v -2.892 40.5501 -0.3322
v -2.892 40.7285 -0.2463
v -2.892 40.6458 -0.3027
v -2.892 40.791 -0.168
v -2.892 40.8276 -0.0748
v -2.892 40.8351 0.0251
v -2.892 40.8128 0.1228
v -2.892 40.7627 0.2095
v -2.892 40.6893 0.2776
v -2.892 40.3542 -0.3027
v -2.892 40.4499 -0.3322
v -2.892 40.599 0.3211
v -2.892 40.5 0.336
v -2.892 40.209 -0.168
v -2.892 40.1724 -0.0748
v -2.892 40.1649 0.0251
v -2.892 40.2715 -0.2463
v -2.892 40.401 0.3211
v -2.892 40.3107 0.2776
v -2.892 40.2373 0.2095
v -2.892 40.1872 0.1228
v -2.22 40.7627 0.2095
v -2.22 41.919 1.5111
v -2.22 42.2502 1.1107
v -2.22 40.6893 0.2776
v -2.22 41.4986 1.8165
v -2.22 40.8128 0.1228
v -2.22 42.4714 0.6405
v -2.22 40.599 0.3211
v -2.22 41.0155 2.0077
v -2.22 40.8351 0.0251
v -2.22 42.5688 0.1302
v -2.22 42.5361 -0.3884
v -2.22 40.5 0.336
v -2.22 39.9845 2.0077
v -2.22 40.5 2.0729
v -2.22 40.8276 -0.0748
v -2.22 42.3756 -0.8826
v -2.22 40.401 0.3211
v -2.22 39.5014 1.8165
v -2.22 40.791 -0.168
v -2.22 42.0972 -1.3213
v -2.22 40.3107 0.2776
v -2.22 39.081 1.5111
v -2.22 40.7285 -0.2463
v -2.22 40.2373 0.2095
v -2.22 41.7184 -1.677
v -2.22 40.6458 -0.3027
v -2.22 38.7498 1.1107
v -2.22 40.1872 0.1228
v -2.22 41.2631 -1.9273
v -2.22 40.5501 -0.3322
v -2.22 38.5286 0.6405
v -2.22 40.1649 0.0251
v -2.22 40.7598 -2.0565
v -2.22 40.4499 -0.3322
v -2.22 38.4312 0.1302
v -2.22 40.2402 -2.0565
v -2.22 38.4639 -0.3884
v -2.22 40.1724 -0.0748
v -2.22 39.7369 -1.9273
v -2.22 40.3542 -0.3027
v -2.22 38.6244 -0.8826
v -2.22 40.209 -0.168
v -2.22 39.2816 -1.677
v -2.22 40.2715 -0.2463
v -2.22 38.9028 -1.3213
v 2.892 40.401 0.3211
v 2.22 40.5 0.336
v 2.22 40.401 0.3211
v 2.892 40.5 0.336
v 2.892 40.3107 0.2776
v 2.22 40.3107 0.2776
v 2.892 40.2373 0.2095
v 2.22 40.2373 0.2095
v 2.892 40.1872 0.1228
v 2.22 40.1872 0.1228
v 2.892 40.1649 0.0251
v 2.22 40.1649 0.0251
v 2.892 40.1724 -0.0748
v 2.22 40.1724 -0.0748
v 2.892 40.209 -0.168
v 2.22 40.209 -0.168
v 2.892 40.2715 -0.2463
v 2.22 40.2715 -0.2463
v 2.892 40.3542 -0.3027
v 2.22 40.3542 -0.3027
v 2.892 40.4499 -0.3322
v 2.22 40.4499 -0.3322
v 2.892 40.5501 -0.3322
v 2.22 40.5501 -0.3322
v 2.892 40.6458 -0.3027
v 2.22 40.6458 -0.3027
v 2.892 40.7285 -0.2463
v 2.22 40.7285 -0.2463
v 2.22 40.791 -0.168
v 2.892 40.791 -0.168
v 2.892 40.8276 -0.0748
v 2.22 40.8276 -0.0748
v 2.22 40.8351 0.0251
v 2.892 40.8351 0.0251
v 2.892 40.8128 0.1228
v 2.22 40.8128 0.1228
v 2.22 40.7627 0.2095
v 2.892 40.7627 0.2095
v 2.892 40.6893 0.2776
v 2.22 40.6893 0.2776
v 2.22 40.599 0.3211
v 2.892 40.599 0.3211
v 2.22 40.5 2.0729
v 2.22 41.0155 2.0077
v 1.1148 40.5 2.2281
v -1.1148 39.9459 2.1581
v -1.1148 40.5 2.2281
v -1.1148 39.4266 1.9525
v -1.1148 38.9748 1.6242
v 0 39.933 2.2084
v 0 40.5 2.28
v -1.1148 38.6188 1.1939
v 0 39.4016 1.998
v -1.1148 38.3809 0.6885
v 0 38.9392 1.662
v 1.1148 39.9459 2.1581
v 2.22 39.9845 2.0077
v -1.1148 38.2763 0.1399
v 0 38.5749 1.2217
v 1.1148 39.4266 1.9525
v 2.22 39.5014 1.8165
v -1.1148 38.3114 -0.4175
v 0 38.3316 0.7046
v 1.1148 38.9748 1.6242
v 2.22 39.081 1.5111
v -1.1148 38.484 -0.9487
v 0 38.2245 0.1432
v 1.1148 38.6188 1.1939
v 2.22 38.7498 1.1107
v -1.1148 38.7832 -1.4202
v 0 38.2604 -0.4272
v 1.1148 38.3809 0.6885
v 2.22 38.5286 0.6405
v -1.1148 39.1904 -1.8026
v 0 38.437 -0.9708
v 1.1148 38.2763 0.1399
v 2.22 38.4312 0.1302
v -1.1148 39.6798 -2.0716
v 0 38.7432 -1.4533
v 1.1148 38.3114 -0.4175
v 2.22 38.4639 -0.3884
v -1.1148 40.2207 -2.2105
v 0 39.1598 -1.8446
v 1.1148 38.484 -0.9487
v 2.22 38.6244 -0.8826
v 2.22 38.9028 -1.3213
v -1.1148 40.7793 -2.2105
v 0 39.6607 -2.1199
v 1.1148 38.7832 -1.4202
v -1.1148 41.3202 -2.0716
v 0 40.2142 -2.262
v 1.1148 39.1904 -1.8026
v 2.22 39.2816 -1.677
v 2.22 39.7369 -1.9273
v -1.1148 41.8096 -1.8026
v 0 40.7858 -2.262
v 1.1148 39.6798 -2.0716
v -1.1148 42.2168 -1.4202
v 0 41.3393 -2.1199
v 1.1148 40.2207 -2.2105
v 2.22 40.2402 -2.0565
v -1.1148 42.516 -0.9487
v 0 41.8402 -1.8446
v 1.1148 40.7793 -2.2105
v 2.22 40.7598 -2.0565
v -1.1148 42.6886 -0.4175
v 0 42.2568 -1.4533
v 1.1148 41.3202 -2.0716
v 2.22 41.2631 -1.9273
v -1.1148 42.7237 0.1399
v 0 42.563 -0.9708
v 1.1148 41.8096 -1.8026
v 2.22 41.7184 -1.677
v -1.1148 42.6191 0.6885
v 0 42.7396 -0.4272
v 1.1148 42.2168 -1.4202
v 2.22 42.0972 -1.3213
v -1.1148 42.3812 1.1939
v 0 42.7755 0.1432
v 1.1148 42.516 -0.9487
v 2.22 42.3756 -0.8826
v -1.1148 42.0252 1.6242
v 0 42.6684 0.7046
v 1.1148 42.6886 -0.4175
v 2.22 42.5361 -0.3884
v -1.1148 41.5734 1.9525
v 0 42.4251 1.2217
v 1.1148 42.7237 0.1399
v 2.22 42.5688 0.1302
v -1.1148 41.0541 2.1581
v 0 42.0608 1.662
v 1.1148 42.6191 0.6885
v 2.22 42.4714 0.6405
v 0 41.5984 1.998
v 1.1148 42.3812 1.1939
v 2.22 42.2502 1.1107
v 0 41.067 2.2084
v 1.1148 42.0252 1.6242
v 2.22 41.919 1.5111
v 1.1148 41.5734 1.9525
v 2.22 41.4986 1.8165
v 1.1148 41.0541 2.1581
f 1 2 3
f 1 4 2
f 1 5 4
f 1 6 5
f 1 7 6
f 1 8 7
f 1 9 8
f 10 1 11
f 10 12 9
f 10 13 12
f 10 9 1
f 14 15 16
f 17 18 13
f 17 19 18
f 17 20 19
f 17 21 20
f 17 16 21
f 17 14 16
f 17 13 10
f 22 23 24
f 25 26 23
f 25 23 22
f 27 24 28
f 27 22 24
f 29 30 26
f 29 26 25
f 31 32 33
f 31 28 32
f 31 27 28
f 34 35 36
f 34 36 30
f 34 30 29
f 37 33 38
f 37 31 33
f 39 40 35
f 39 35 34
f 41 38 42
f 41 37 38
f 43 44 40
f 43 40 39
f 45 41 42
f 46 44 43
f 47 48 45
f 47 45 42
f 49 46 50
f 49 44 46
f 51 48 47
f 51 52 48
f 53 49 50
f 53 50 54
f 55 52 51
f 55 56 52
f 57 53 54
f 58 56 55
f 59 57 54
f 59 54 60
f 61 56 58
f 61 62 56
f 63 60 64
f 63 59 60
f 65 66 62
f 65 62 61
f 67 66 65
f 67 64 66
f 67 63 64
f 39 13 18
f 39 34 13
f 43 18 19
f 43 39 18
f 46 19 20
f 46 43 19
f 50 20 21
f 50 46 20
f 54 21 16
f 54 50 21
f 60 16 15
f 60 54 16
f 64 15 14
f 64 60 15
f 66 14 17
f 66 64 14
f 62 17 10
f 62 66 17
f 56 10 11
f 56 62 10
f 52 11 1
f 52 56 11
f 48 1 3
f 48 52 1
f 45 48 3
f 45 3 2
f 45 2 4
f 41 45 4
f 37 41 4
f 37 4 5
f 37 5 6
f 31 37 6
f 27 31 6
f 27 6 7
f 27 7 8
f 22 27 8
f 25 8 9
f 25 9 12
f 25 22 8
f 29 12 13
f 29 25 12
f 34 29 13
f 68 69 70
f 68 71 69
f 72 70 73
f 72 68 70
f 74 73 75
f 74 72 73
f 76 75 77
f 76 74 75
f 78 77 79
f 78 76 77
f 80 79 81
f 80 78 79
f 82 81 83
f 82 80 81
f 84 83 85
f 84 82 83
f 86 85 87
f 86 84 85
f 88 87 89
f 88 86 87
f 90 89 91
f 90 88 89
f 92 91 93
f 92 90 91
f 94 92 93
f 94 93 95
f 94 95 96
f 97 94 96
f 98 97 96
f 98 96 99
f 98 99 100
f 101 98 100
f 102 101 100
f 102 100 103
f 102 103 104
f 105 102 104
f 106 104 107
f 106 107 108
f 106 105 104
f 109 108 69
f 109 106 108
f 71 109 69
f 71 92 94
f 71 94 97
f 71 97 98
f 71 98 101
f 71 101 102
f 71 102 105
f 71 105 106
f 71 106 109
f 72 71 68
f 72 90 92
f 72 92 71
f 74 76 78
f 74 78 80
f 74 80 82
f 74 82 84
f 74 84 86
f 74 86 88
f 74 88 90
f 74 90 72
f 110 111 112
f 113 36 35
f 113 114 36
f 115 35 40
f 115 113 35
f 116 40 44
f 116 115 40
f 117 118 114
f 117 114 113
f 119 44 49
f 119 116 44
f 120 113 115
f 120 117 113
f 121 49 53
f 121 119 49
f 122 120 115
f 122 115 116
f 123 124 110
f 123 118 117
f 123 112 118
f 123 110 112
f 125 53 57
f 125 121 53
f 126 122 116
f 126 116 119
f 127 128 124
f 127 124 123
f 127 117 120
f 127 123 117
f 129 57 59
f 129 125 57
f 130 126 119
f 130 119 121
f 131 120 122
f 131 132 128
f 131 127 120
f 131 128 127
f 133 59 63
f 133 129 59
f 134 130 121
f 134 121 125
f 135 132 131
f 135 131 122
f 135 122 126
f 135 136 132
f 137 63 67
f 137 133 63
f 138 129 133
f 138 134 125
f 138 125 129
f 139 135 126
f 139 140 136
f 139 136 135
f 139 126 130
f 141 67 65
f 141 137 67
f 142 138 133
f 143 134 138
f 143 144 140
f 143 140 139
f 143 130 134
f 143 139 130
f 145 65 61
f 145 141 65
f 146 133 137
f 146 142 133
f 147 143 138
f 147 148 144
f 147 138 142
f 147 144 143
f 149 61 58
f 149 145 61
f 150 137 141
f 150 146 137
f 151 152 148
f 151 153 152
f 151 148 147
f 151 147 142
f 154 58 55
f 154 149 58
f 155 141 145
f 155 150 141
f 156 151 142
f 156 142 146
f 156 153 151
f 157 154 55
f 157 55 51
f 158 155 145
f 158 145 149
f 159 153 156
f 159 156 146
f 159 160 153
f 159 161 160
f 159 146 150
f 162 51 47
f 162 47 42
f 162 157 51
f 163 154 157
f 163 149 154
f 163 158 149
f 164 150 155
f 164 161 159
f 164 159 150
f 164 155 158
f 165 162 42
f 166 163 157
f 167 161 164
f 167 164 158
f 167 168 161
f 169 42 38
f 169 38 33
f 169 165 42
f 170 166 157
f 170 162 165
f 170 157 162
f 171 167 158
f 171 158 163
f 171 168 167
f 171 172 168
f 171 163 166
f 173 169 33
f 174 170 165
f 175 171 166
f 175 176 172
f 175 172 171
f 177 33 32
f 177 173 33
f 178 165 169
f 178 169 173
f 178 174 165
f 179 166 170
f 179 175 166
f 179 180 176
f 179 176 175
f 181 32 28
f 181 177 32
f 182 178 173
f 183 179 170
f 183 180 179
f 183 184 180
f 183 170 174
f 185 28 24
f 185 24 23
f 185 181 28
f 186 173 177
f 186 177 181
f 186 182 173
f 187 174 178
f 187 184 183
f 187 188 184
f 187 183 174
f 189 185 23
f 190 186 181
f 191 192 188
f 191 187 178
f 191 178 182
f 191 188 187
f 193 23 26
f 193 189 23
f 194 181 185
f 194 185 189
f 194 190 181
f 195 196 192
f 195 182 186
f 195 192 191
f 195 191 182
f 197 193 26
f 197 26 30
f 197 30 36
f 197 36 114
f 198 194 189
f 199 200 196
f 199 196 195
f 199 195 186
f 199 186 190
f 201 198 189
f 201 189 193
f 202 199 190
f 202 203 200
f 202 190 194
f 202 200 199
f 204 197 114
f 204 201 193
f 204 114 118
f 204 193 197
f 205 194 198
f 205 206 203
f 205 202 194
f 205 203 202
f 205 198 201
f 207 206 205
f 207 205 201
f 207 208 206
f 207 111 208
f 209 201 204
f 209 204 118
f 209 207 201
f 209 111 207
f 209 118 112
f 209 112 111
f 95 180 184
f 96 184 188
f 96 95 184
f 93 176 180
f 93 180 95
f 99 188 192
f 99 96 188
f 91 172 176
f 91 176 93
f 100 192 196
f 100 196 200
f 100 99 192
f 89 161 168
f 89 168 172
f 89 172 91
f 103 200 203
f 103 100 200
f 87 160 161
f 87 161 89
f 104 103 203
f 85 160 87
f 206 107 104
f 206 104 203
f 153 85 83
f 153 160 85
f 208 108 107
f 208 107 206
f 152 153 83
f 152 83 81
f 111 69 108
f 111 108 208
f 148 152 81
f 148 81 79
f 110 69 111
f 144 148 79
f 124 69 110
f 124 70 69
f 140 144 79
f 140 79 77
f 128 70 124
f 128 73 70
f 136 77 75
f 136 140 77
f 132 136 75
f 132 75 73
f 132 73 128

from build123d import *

# Parameters (mm, degrees)
SCALE1_SCALE = 0.24


with BuildPart() as part:
    # Sketch1 → Revolve1 (revolve)
    with BuildSketch(Plane.XY, mode=Mode.PRIVATE) as revolve1_sk:
        with BuildLine():
            Line((9.25, 49.136926033), (9.25, 41.9))
            Line((9.25, 41.9), (12.05, 41.9))
            Line((12.05, 41.9), (12.05, 40.5))
            Line((12.05, 40.5), (9.25, 40.5))
            Line((9.25, 40.5), (-9.25, 40.5))
            Line((-9.25, 40.5), (-12.05, 40.5))
            Line((-12.05, 40.5), (-12.05, 41.9))
            Line((-12.05, 41.9), (-9.25, 41.9))
            Line((-9.25, 41.9), (-9.25, 49.136926033))
            ThreePointArc((-9.25, 49.136926033), (0, 50), (9.25, 49.136926033))
        make_face()
    revolve(revolve1_sk.sketch.rotate(Axis((-9.25, 40.5, 0), (1, 0, 0)), 90), axis=Axis((-9.25, 40.5, 0), (1, 0, 0)))


with BuildPart() as part_1:
    # Scale1: scaled about (0, 40.5, 0)
    add(part.part.scale(SCALE1_SCALE).moved(Location((0, 30.78, 0))))


solid = part_1.part
